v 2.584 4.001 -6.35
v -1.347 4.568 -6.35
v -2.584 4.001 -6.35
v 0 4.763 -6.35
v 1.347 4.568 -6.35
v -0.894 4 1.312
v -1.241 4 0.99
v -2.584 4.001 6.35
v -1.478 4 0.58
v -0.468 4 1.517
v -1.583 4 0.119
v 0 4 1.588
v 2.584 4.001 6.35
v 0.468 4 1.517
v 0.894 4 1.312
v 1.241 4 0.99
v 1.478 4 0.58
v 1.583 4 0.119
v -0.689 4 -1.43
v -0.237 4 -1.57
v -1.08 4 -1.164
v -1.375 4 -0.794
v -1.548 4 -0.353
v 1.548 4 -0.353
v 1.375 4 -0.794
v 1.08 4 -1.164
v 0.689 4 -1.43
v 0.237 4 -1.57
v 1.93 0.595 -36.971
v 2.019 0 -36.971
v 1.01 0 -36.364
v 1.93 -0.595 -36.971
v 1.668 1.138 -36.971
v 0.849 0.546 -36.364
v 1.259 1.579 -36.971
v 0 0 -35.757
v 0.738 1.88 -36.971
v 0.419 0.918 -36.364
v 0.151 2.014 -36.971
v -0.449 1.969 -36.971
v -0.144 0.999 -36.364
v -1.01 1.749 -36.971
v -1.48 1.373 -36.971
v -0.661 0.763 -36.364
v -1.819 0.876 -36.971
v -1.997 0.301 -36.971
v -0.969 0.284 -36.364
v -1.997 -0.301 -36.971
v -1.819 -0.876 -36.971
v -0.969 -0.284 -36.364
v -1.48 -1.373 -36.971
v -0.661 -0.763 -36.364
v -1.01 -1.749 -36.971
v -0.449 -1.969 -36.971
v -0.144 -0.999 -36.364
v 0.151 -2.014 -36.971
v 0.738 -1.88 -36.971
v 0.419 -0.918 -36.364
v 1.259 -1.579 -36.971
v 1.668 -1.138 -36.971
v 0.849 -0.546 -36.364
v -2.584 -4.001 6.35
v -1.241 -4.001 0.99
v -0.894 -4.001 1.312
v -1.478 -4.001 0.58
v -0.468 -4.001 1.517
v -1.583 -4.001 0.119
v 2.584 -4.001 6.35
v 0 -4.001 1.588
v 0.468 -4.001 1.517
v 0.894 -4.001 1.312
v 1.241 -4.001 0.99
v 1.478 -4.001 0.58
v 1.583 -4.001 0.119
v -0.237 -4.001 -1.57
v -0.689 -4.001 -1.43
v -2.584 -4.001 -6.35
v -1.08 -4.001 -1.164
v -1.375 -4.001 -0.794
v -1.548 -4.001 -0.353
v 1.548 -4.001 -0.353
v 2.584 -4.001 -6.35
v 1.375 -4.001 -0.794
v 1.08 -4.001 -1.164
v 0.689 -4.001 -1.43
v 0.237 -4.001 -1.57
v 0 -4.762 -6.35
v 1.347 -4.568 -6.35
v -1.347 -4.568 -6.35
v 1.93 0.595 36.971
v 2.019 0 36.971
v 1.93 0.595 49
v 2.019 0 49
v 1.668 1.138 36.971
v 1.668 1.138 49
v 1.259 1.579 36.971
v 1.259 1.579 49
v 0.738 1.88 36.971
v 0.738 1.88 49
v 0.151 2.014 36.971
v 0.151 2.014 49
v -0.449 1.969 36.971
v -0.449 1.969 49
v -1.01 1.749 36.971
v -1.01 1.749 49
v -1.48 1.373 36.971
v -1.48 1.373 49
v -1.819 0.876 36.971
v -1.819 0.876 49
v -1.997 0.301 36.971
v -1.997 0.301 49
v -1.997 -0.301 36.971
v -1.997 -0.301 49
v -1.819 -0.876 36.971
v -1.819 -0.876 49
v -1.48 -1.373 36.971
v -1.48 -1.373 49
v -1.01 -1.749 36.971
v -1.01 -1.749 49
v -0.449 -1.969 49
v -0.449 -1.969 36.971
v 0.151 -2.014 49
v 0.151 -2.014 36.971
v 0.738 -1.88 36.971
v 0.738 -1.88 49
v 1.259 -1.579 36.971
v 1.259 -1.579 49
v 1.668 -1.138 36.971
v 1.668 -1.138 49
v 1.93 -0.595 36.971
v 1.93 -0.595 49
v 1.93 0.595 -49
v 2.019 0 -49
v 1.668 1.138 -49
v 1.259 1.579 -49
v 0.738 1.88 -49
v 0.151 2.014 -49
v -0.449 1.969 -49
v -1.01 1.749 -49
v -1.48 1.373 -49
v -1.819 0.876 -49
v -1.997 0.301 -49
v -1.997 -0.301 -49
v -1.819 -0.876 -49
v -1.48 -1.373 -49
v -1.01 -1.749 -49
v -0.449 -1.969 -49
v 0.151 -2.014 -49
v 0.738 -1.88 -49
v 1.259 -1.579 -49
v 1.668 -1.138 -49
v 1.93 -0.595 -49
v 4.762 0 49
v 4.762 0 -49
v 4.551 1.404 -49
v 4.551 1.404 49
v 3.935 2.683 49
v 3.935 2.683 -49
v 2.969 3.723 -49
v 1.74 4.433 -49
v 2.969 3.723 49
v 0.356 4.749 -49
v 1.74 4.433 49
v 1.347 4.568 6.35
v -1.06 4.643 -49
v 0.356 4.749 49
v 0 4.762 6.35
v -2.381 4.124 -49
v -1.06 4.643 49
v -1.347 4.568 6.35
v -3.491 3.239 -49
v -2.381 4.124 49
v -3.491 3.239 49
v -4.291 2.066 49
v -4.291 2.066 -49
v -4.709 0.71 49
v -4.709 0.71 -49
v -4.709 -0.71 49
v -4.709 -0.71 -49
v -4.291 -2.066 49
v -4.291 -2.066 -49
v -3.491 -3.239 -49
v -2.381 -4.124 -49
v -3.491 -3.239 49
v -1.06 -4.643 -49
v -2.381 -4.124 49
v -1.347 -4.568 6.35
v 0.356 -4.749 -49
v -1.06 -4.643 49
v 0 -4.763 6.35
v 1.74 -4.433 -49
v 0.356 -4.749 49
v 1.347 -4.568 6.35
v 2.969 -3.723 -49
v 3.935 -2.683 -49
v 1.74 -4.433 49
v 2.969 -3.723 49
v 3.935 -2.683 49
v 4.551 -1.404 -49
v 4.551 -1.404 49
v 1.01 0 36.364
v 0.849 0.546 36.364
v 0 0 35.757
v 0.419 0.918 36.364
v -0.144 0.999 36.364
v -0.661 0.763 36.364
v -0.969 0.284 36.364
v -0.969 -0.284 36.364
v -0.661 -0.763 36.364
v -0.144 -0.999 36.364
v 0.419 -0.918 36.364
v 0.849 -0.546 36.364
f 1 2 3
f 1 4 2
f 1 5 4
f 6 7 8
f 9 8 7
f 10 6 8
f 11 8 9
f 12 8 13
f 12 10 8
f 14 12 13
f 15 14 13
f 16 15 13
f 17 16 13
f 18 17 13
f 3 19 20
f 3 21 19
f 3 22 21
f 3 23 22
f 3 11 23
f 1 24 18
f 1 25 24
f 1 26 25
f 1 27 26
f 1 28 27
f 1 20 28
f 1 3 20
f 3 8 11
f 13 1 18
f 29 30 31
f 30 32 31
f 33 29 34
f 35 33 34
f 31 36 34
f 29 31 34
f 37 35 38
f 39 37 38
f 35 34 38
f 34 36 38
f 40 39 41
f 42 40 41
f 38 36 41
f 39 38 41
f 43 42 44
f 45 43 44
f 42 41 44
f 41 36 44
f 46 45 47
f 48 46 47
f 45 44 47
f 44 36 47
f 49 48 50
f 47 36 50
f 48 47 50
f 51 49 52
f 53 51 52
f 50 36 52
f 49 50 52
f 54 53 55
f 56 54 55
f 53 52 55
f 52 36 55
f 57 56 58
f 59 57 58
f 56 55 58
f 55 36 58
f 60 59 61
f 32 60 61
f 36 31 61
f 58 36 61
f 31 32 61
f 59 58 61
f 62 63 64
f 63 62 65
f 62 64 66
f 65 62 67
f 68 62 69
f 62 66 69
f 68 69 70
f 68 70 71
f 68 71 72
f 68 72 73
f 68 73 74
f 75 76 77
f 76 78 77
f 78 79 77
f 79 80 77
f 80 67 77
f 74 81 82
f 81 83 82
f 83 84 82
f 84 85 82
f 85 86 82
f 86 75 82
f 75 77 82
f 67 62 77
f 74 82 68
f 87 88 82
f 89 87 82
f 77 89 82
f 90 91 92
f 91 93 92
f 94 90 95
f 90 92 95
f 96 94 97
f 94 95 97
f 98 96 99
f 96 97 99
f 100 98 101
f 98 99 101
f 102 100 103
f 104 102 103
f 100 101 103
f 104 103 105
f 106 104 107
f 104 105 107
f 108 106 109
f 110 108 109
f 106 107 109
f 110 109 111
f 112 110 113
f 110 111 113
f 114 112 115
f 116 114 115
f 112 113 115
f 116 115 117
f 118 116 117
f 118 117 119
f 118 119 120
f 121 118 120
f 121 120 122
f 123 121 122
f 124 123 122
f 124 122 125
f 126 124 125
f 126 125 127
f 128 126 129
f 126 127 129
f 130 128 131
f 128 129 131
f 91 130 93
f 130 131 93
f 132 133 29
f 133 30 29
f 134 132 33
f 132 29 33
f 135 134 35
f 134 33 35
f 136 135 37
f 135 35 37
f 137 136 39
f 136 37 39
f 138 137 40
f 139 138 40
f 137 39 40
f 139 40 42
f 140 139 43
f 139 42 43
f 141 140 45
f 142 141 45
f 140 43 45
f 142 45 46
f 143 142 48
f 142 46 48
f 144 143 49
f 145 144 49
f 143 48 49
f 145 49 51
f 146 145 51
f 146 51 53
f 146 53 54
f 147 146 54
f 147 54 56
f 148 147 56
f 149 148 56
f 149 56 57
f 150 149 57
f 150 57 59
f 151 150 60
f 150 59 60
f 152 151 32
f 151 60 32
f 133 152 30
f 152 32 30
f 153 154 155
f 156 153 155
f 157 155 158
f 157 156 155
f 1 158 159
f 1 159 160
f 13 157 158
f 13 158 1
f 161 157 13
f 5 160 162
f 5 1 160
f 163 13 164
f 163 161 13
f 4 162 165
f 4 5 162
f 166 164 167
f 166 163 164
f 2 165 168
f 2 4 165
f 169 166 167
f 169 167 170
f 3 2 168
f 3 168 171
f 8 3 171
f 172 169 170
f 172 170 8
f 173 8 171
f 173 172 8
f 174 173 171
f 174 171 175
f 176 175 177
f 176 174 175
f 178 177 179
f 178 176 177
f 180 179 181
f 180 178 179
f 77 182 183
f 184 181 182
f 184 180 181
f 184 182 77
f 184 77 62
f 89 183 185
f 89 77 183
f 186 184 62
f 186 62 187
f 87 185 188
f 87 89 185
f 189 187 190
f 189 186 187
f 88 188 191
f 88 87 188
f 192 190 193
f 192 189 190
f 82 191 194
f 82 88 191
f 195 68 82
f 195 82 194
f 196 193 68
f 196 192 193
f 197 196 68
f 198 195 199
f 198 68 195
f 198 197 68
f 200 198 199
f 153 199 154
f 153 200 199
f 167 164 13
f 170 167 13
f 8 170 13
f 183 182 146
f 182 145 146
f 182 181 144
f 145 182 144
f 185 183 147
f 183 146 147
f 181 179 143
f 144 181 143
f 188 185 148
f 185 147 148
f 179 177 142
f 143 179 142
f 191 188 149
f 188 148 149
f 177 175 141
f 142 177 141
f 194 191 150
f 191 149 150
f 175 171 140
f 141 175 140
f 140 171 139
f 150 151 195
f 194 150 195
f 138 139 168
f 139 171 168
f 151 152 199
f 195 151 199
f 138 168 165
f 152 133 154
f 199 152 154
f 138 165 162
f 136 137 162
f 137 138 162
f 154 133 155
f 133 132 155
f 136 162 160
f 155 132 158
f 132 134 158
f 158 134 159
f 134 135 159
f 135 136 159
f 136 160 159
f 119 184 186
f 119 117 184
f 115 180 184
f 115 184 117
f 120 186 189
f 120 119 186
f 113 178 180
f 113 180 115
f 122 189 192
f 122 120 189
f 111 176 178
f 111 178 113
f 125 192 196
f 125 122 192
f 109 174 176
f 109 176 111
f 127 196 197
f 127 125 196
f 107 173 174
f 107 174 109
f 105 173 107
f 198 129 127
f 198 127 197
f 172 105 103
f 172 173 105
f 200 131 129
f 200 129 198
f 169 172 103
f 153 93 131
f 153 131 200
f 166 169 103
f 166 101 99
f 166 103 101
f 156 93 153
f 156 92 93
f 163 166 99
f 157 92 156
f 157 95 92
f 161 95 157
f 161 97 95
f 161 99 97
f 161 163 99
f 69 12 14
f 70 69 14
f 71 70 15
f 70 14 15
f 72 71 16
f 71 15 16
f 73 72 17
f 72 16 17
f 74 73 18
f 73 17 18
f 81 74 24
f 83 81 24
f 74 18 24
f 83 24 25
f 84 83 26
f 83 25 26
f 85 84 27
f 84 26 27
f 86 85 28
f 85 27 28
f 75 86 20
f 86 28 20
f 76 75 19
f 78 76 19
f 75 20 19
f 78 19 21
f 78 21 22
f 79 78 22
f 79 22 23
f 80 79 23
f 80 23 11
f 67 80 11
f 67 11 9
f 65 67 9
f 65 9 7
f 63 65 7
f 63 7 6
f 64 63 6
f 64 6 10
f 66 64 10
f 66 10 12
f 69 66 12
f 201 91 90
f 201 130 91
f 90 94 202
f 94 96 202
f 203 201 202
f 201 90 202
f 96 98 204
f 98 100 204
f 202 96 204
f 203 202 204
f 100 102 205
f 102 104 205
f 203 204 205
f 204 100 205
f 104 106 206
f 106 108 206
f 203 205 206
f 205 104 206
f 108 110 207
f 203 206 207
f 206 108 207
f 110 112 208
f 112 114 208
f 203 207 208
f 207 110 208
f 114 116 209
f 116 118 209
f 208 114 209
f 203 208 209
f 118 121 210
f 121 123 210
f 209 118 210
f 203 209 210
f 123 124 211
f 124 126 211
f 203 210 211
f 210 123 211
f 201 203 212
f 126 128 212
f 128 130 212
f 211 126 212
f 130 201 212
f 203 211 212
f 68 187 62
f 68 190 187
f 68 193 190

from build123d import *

# Parameters (mm, degrees)
SKETCH1_R           = 4.7625
BOSS_EXTRUDE1_DEPTH = 49.000000044
SKETCH4_W           = 12.7
SKETCH4_H           = 12.7
CUT_EXTRUDE1_DEPTH  = 0.762
SKETCH5_R           = 1.5875
CUT_EXTRUDE2_DEPTH  = 51.004715573


# Read off the part's stored shape, not the designer's step: #10-32 Tapped Hole1
with BuildPart() as part:
    # Sketch1 → Boss-Extrude1 (new, symmetric)
    with BuildSketch(Plane.XY):
        Circle(SKETCH1_R)
    extrude(amount=BOSS_EXTRUDE1_DEPTH, both=True)

    # #10-32 Tapped Hole1 outline → #10-32 Tapped Hole1 (revolve, cut)
    with BuildSketch(Plane.XZ):
        Polygon((2.0193, -36.970560044), (0, -35.757242196), (0, -49.000000044), (2.0193, -49.000000044), align=None)
        Polygon((0, 49.000000044), (0, 35.757242196), (2.0193, 36.970560044), (2.0193, 49.000000044), align=None)
    revolve(axis=Axis((0, 0, 0), (0, 0, 1)), mode=Mode.SUBTRACT)

    # Sketch4 → Cut-Extrude1 (cut)
    with BuildSketch(Plane(origin=(0, 4.7625, 0), x_dir=(1, 0, 0), z_dir=(0, 1, 0))):
        Rectangle(SKETCH4_W, SKETCH4_H)
    cut_extrude1 = extrude(amount=-CUT_EXTRUDE1_DEPTH, mode=Mode.SUBTRACT)

    # Sketch5 → Cut-Extrude2 (cut, through all)
    with BuildSketch(Plane(origin=(0, 4.0005, 0), x_dir=(1, 0, 0), z_dir=(0, 1, 0))):
        with Locations(Location((0, 0, 0), (0, 0, 270))):
            Circle(SKETCH5_R)
    extrude(amount=-CUT_EXTRUDE2_DEPTH, mode=Mode.SUBTRACT)

    # Mirror1: Cut-Extrude1 across plane
    add(cut_extrude1.mirror(Plane.ZX), mode=Mode.SUBTRACT)


solid = part.part
